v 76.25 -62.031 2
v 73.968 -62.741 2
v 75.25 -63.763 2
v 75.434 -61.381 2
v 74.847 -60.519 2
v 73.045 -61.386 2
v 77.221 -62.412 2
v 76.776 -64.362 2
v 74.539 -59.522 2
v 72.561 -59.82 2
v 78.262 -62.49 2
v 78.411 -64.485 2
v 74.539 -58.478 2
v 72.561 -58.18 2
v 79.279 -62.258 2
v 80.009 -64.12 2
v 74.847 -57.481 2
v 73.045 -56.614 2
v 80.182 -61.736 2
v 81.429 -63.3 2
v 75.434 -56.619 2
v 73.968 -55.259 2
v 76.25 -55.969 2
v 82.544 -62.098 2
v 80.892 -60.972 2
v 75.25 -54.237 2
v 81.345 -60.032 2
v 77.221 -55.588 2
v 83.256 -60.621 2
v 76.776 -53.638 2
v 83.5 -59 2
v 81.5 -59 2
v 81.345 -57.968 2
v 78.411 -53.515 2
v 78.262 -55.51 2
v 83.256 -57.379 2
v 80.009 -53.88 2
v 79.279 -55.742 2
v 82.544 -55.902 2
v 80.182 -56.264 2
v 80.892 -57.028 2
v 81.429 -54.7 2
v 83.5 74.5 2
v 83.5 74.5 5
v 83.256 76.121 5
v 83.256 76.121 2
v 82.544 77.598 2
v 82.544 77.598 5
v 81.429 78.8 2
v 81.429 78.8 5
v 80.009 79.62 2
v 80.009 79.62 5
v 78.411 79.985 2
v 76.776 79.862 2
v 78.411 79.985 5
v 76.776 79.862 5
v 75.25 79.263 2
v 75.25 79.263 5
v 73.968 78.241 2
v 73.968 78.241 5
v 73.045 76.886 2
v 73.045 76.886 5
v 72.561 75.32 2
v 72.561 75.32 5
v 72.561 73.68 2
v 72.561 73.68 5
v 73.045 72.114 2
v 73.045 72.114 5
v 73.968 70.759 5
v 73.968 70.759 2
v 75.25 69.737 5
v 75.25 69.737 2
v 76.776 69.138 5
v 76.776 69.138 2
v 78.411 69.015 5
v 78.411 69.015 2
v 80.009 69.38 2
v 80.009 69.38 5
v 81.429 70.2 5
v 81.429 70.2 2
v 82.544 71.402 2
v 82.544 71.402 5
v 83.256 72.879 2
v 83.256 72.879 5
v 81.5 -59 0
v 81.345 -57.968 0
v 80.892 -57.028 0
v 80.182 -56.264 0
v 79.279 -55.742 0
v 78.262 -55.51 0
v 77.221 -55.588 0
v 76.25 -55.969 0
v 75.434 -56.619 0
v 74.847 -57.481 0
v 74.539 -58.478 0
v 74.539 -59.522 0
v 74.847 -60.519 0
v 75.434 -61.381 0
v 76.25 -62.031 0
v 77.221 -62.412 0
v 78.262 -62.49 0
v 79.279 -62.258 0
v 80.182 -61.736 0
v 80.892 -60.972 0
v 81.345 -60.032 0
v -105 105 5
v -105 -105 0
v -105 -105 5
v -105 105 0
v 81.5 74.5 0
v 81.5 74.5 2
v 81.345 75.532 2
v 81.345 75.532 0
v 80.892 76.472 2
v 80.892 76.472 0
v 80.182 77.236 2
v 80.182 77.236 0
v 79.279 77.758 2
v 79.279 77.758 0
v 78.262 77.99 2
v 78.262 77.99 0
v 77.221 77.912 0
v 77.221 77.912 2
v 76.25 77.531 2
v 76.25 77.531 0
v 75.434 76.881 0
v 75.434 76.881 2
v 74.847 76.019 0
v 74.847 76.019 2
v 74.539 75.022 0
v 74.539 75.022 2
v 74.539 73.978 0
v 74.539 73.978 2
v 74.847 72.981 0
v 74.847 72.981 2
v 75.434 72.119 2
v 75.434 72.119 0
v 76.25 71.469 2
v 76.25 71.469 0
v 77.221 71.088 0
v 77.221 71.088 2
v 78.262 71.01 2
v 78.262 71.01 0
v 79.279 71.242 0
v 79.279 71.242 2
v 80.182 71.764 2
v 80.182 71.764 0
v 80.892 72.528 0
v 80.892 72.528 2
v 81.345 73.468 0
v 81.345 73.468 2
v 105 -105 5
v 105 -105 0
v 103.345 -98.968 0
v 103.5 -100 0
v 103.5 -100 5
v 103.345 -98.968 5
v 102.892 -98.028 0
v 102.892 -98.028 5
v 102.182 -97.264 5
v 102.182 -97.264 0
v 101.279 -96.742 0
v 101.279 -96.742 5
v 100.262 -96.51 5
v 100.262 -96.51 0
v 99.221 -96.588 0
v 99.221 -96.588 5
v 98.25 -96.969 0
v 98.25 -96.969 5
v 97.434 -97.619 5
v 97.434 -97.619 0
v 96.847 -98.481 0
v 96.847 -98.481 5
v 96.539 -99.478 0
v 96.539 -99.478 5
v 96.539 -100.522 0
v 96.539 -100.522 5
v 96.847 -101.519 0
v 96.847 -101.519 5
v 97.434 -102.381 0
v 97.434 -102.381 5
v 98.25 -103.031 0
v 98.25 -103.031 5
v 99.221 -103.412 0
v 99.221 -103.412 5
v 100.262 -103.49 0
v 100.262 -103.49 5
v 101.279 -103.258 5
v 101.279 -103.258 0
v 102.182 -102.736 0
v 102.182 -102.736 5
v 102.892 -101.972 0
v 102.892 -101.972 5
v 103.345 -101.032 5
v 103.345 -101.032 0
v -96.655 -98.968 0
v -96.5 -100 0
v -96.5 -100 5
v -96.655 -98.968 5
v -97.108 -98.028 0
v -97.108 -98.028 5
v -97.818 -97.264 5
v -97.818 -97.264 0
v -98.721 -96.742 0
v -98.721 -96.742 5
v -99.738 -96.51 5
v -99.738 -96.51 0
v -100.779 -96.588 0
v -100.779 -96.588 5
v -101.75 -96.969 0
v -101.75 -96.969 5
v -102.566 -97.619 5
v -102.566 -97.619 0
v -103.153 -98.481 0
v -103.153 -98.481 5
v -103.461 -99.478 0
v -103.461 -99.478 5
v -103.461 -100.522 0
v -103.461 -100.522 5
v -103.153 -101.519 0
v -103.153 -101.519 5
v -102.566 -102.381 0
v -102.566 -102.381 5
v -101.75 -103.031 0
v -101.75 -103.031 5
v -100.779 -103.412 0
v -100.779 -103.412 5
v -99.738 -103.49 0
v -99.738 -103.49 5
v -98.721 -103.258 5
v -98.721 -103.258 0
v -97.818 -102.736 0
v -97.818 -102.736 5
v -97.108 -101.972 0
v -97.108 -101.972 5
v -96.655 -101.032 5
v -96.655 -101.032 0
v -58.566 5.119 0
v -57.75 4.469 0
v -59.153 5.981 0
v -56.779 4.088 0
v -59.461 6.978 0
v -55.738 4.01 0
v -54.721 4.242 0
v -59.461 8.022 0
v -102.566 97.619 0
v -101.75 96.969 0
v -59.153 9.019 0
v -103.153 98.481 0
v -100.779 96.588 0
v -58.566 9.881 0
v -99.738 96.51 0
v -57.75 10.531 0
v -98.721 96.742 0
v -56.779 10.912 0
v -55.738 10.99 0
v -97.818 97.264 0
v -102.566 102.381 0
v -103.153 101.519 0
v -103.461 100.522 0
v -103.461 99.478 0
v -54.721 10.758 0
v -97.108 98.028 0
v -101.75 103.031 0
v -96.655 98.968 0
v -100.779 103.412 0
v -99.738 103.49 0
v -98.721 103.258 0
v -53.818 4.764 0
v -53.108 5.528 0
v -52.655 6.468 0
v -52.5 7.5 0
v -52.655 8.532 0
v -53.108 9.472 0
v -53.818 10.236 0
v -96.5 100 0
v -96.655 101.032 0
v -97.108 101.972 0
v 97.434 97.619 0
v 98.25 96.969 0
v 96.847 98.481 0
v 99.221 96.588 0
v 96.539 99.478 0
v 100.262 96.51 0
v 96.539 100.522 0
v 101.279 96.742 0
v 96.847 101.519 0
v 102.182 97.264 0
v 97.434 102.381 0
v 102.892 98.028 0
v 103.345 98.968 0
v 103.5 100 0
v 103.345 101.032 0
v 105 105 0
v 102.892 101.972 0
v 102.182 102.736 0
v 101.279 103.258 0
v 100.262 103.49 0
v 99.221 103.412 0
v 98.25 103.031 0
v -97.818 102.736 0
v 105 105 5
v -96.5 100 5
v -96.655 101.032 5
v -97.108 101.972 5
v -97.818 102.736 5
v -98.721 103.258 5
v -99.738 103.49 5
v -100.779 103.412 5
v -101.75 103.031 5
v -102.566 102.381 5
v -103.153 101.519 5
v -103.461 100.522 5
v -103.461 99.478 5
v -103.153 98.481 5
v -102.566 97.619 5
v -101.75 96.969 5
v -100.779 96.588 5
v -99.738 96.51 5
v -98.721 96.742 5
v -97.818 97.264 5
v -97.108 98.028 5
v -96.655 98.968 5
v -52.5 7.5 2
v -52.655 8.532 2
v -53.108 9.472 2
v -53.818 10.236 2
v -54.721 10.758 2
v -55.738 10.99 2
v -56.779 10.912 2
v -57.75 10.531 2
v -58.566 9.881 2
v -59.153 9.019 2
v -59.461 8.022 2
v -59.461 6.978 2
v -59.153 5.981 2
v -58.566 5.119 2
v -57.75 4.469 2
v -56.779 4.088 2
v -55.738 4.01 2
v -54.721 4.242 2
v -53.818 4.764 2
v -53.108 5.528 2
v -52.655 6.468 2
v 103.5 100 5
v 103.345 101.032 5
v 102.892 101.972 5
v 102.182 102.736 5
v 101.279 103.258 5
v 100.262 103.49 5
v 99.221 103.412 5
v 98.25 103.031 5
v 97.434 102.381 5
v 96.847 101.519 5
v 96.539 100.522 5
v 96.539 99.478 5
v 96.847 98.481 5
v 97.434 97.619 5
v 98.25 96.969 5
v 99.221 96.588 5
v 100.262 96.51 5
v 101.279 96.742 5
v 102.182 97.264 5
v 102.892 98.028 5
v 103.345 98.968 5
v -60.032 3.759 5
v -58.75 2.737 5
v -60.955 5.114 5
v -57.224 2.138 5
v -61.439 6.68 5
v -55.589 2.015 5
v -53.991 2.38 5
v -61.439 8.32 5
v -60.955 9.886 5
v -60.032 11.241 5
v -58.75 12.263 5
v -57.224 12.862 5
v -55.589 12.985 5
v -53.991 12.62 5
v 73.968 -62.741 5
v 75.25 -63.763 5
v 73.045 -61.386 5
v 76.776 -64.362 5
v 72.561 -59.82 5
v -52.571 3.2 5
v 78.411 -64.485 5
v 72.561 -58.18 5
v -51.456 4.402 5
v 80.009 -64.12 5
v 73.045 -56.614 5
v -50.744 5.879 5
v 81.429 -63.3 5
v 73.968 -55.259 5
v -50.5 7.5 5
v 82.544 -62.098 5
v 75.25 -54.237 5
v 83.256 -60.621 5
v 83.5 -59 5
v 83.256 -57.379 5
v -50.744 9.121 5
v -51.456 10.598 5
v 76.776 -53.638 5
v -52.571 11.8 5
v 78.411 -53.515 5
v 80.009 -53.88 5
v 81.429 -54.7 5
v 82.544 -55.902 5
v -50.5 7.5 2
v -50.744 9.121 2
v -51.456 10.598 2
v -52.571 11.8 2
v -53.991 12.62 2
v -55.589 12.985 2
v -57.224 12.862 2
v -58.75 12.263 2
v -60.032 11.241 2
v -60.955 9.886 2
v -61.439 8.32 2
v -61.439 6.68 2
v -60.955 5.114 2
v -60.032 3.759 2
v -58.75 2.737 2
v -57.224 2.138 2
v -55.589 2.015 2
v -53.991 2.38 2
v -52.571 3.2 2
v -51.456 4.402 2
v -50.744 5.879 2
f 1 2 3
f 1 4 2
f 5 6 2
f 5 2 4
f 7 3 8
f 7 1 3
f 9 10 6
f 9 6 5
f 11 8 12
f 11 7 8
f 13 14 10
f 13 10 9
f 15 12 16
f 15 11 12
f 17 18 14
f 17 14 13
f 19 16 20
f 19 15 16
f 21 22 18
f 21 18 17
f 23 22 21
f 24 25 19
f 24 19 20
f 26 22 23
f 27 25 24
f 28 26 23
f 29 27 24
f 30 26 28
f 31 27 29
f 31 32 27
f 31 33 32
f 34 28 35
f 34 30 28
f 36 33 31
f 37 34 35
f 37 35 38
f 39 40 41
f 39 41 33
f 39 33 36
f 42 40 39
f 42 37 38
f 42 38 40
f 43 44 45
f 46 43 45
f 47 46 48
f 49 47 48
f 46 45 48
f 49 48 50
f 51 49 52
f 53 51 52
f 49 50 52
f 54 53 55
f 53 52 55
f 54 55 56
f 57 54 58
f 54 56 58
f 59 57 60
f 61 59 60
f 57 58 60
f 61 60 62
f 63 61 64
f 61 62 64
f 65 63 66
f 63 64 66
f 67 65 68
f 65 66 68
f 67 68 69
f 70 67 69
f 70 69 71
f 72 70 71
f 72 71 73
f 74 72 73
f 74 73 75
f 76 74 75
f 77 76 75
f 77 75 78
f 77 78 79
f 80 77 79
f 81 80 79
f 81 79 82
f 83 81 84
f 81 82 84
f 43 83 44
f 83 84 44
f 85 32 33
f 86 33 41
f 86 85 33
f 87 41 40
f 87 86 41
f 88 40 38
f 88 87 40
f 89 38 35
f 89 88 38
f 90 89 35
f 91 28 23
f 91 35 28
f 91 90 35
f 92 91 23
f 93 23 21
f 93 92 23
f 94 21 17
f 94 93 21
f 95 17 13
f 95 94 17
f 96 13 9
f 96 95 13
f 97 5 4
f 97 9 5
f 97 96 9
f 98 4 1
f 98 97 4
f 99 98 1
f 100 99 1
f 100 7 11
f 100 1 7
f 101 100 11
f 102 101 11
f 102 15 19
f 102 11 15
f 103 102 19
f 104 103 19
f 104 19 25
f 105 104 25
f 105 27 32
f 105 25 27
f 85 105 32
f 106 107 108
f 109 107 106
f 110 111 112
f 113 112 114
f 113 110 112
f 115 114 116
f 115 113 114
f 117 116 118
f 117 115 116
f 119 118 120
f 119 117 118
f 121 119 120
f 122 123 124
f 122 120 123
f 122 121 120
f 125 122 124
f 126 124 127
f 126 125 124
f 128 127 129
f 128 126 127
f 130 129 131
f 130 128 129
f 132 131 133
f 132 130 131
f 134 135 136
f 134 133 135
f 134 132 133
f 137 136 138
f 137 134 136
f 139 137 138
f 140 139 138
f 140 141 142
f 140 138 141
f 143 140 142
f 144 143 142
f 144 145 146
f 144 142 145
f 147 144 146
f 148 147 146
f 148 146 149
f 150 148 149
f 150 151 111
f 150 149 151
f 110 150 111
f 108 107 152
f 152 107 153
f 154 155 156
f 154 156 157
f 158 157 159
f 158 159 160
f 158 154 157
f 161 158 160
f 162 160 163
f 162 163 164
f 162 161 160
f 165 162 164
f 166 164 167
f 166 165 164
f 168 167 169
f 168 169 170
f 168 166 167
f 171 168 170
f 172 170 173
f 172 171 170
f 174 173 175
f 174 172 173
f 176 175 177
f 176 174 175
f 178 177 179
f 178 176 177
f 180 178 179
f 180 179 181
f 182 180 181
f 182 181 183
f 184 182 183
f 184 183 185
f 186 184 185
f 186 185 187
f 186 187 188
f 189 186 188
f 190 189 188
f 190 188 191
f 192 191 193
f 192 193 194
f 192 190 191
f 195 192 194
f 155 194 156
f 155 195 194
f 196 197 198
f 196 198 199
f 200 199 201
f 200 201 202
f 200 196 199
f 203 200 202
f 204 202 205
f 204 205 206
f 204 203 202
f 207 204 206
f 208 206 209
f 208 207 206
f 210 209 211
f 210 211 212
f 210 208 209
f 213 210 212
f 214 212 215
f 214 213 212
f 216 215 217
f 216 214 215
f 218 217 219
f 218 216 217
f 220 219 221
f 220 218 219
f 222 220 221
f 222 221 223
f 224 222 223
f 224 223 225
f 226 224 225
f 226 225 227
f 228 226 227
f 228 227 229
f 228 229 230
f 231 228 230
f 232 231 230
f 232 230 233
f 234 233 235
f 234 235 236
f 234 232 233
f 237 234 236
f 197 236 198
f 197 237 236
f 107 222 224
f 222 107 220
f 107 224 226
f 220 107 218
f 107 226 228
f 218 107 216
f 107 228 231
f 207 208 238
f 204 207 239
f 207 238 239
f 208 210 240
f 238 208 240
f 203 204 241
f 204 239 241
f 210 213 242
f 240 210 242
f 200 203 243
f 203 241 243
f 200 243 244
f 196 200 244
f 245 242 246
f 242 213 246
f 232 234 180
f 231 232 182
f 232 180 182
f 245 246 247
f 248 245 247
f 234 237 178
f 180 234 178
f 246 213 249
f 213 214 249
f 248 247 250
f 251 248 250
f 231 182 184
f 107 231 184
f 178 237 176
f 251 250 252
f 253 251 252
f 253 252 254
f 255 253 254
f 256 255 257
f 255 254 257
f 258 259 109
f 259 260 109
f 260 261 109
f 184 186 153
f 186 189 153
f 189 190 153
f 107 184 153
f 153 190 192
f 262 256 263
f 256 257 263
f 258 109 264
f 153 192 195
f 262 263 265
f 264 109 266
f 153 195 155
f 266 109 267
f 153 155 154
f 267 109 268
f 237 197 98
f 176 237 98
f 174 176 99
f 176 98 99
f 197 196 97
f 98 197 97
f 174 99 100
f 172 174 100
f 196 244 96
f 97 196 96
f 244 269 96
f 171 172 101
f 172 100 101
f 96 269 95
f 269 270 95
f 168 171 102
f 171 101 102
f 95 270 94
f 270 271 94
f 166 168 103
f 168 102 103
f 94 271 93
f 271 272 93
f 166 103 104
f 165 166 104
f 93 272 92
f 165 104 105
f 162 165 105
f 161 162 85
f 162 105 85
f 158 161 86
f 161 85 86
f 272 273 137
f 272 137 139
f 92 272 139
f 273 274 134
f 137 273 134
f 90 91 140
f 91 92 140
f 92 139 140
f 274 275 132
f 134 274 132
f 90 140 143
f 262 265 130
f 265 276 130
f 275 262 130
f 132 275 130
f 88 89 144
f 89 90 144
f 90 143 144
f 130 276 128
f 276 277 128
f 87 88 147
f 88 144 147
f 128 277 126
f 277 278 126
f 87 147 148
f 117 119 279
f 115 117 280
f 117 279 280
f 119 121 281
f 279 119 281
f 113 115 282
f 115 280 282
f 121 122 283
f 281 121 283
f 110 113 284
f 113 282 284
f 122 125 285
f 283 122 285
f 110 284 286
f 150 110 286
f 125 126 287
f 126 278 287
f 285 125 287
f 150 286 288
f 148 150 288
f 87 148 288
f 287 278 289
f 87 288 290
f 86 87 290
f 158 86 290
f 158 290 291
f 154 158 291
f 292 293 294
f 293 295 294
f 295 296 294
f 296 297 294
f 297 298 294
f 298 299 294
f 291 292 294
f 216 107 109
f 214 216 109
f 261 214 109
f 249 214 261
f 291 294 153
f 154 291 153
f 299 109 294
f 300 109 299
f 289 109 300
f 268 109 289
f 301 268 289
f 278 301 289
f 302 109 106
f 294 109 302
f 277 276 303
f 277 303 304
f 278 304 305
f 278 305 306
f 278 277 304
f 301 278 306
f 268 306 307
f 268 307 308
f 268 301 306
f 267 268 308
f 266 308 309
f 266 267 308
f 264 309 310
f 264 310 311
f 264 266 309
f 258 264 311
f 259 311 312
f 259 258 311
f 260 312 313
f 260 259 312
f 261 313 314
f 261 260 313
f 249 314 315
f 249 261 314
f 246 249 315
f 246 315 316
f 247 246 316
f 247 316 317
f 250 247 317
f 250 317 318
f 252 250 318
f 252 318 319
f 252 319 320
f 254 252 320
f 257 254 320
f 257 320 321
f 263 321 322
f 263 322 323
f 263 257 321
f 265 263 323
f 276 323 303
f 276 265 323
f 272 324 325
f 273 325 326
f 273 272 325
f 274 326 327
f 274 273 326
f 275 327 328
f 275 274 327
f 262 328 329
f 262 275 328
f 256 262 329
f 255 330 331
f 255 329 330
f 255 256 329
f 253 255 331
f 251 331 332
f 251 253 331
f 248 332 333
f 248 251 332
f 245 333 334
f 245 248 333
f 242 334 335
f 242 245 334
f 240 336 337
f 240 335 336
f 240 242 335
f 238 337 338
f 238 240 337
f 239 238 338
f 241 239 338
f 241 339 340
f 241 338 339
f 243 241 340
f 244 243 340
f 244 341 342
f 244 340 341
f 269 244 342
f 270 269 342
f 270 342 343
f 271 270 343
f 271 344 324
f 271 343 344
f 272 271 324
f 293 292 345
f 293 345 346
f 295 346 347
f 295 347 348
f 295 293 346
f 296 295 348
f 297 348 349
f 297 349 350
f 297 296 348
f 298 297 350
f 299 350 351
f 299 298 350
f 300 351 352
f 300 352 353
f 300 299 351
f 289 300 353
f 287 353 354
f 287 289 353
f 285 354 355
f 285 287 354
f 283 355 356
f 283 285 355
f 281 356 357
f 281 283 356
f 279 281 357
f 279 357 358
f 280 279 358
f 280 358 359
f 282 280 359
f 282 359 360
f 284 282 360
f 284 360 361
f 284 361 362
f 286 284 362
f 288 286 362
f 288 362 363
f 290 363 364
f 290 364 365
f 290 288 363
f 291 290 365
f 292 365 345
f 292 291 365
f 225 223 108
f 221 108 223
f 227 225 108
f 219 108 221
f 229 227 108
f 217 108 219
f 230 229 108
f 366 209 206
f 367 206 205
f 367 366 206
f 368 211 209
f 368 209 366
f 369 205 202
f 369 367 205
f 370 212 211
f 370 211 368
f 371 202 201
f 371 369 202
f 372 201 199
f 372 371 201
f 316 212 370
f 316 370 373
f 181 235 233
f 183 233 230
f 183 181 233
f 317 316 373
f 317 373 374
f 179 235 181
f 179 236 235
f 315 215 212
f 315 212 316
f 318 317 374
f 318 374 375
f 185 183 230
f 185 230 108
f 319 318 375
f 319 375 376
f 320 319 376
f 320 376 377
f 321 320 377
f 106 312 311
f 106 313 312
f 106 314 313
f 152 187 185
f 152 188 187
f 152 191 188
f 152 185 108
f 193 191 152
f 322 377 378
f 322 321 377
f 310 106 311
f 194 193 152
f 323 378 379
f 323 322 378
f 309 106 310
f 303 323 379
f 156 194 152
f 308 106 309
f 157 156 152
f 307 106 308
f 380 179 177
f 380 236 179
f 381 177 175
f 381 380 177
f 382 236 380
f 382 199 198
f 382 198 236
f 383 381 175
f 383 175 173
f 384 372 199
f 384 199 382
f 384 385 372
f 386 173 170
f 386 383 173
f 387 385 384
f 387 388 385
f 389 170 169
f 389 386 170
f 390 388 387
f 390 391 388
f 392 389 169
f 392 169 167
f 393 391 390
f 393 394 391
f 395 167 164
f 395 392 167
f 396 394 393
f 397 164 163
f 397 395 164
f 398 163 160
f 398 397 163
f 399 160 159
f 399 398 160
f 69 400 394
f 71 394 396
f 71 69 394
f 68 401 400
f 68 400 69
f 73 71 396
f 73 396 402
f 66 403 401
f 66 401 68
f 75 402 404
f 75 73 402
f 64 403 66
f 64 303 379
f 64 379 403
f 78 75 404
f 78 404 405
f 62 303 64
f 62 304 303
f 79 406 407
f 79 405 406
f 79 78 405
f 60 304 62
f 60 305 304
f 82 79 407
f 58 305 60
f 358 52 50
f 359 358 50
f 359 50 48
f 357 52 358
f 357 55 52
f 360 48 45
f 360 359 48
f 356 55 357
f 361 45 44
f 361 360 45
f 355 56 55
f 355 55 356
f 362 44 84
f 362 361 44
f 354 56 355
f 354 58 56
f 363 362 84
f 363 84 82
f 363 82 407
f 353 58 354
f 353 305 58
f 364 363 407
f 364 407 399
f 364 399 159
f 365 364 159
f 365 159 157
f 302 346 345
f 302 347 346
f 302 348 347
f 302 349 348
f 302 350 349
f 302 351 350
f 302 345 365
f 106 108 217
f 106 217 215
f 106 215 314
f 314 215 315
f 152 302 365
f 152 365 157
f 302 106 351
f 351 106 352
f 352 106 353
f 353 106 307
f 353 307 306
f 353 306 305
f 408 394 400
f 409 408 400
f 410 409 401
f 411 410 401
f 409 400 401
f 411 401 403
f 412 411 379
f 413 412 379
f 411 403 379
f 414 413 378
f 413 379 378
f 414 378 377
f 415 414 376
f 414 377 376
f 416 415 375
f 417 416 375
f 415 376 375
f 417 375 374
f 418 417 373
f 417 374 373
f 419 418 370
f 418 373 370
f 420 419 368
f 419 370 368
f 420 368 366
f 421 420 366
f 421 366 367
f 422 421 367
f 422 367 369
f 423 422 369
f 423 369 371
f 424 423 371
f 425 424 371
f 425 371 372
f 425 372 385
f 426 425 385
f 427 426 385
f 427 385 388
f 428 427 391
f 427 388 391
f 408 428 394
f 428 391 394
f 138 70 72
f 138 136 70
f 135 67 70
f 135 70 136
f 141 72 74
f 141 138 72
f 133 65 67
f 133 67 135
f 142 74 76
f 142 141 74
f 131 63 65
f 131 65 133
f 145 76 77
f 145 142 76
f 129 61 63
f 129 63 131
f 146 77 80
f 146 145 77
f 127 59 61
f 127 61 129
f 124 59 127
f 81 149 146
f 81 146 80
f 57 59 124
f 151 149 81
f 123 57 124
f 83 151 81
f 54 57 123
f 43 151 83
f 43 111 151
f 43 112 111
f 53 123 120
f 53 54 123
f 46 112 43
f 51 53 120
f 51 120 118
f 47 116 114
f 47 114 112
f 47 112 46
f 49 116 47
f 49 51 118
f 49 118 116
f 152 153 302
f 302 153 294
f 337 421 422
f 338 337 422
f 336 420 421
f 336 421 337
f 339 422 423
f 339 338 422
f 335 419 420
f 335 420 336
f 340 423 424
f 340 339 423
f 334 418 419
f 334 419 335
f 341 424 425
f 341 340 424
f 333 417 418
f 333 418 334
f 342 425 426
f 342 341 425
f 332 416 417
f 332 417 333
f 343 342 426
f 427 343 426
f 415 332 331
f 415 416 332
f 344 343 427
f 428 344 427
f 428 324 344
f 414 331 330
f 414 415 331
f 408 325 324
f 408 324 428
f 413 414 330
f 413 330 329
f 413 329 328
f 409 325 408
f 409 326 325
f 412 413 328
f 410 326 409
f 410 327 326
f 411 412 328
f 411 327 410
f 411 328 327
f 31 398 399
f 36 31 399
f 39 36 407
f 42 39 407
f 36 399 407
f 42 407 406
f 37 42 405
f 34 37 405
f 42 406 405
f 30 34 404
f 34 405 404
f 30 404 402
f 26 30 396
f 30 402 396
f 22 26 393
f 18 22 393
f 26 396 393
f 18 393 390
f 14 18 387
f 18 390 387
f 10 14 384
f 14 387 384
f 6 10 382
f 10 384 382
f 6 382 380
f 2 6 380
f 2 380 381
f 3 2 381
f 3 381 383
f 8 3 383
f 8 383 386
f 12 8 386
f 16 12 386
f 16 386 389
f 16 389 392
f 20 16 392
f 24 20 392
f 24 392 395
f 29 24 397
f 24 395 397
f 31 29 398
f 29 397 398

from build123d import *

# Parameters (mm, degrees)
F0_W     = 210
F0_H     = 210
F0_R     = 3.5
F1_DEPTH = 5
F2_R     = 5.5
F3_DEPTH = 3


with BuildPart() as f1:
    # F0 (on Top) → F1 (new body)
    with BuildSketch(Plane.XY):
        Rectangle(F0_W, F0_H)
        with Locations((-100, -100)):
            Circle(F0_R, mode=Mode.SUBTRACT)
        with Locations((100, -100)):
            Circle(F0_R, mode=Mode.SUBTRACT)
        with Locations((78, -59)):
            Circle(F0_R, mode=Mode.SUBTRACT)
        with Locations((-56, 7.5)):
            Circle(F0_R, mode=Mode.SUBTRACT)
        with Locations((-100, 100)):
            Circle(F0_R, mode=Mode.SUBTRACT)
        with Locations((78, 74.5)):
            Circle(F0_R, mode=Mode.SUBTRACT)
        with Locations((100, 100)):
            Circle(F0_R, mode=Mode.SUBTRACT)
    extrude(amount=F1_DEPTH)

    # F2 (on face) → F3 (cut)
    with BuildSketch(Plane.XY.offset(5)):
        with Locations((-56, 7.5)):
            Circle(F2_R)
        with Locations((78, 74.5)):
            Circle(F2_R)
        with Locations((78, -59)):
            Circle(F2_R)
    extrude(amount=-F3_DEPTH, mode=Mode.SUBTRACT)


solid = f1.part
